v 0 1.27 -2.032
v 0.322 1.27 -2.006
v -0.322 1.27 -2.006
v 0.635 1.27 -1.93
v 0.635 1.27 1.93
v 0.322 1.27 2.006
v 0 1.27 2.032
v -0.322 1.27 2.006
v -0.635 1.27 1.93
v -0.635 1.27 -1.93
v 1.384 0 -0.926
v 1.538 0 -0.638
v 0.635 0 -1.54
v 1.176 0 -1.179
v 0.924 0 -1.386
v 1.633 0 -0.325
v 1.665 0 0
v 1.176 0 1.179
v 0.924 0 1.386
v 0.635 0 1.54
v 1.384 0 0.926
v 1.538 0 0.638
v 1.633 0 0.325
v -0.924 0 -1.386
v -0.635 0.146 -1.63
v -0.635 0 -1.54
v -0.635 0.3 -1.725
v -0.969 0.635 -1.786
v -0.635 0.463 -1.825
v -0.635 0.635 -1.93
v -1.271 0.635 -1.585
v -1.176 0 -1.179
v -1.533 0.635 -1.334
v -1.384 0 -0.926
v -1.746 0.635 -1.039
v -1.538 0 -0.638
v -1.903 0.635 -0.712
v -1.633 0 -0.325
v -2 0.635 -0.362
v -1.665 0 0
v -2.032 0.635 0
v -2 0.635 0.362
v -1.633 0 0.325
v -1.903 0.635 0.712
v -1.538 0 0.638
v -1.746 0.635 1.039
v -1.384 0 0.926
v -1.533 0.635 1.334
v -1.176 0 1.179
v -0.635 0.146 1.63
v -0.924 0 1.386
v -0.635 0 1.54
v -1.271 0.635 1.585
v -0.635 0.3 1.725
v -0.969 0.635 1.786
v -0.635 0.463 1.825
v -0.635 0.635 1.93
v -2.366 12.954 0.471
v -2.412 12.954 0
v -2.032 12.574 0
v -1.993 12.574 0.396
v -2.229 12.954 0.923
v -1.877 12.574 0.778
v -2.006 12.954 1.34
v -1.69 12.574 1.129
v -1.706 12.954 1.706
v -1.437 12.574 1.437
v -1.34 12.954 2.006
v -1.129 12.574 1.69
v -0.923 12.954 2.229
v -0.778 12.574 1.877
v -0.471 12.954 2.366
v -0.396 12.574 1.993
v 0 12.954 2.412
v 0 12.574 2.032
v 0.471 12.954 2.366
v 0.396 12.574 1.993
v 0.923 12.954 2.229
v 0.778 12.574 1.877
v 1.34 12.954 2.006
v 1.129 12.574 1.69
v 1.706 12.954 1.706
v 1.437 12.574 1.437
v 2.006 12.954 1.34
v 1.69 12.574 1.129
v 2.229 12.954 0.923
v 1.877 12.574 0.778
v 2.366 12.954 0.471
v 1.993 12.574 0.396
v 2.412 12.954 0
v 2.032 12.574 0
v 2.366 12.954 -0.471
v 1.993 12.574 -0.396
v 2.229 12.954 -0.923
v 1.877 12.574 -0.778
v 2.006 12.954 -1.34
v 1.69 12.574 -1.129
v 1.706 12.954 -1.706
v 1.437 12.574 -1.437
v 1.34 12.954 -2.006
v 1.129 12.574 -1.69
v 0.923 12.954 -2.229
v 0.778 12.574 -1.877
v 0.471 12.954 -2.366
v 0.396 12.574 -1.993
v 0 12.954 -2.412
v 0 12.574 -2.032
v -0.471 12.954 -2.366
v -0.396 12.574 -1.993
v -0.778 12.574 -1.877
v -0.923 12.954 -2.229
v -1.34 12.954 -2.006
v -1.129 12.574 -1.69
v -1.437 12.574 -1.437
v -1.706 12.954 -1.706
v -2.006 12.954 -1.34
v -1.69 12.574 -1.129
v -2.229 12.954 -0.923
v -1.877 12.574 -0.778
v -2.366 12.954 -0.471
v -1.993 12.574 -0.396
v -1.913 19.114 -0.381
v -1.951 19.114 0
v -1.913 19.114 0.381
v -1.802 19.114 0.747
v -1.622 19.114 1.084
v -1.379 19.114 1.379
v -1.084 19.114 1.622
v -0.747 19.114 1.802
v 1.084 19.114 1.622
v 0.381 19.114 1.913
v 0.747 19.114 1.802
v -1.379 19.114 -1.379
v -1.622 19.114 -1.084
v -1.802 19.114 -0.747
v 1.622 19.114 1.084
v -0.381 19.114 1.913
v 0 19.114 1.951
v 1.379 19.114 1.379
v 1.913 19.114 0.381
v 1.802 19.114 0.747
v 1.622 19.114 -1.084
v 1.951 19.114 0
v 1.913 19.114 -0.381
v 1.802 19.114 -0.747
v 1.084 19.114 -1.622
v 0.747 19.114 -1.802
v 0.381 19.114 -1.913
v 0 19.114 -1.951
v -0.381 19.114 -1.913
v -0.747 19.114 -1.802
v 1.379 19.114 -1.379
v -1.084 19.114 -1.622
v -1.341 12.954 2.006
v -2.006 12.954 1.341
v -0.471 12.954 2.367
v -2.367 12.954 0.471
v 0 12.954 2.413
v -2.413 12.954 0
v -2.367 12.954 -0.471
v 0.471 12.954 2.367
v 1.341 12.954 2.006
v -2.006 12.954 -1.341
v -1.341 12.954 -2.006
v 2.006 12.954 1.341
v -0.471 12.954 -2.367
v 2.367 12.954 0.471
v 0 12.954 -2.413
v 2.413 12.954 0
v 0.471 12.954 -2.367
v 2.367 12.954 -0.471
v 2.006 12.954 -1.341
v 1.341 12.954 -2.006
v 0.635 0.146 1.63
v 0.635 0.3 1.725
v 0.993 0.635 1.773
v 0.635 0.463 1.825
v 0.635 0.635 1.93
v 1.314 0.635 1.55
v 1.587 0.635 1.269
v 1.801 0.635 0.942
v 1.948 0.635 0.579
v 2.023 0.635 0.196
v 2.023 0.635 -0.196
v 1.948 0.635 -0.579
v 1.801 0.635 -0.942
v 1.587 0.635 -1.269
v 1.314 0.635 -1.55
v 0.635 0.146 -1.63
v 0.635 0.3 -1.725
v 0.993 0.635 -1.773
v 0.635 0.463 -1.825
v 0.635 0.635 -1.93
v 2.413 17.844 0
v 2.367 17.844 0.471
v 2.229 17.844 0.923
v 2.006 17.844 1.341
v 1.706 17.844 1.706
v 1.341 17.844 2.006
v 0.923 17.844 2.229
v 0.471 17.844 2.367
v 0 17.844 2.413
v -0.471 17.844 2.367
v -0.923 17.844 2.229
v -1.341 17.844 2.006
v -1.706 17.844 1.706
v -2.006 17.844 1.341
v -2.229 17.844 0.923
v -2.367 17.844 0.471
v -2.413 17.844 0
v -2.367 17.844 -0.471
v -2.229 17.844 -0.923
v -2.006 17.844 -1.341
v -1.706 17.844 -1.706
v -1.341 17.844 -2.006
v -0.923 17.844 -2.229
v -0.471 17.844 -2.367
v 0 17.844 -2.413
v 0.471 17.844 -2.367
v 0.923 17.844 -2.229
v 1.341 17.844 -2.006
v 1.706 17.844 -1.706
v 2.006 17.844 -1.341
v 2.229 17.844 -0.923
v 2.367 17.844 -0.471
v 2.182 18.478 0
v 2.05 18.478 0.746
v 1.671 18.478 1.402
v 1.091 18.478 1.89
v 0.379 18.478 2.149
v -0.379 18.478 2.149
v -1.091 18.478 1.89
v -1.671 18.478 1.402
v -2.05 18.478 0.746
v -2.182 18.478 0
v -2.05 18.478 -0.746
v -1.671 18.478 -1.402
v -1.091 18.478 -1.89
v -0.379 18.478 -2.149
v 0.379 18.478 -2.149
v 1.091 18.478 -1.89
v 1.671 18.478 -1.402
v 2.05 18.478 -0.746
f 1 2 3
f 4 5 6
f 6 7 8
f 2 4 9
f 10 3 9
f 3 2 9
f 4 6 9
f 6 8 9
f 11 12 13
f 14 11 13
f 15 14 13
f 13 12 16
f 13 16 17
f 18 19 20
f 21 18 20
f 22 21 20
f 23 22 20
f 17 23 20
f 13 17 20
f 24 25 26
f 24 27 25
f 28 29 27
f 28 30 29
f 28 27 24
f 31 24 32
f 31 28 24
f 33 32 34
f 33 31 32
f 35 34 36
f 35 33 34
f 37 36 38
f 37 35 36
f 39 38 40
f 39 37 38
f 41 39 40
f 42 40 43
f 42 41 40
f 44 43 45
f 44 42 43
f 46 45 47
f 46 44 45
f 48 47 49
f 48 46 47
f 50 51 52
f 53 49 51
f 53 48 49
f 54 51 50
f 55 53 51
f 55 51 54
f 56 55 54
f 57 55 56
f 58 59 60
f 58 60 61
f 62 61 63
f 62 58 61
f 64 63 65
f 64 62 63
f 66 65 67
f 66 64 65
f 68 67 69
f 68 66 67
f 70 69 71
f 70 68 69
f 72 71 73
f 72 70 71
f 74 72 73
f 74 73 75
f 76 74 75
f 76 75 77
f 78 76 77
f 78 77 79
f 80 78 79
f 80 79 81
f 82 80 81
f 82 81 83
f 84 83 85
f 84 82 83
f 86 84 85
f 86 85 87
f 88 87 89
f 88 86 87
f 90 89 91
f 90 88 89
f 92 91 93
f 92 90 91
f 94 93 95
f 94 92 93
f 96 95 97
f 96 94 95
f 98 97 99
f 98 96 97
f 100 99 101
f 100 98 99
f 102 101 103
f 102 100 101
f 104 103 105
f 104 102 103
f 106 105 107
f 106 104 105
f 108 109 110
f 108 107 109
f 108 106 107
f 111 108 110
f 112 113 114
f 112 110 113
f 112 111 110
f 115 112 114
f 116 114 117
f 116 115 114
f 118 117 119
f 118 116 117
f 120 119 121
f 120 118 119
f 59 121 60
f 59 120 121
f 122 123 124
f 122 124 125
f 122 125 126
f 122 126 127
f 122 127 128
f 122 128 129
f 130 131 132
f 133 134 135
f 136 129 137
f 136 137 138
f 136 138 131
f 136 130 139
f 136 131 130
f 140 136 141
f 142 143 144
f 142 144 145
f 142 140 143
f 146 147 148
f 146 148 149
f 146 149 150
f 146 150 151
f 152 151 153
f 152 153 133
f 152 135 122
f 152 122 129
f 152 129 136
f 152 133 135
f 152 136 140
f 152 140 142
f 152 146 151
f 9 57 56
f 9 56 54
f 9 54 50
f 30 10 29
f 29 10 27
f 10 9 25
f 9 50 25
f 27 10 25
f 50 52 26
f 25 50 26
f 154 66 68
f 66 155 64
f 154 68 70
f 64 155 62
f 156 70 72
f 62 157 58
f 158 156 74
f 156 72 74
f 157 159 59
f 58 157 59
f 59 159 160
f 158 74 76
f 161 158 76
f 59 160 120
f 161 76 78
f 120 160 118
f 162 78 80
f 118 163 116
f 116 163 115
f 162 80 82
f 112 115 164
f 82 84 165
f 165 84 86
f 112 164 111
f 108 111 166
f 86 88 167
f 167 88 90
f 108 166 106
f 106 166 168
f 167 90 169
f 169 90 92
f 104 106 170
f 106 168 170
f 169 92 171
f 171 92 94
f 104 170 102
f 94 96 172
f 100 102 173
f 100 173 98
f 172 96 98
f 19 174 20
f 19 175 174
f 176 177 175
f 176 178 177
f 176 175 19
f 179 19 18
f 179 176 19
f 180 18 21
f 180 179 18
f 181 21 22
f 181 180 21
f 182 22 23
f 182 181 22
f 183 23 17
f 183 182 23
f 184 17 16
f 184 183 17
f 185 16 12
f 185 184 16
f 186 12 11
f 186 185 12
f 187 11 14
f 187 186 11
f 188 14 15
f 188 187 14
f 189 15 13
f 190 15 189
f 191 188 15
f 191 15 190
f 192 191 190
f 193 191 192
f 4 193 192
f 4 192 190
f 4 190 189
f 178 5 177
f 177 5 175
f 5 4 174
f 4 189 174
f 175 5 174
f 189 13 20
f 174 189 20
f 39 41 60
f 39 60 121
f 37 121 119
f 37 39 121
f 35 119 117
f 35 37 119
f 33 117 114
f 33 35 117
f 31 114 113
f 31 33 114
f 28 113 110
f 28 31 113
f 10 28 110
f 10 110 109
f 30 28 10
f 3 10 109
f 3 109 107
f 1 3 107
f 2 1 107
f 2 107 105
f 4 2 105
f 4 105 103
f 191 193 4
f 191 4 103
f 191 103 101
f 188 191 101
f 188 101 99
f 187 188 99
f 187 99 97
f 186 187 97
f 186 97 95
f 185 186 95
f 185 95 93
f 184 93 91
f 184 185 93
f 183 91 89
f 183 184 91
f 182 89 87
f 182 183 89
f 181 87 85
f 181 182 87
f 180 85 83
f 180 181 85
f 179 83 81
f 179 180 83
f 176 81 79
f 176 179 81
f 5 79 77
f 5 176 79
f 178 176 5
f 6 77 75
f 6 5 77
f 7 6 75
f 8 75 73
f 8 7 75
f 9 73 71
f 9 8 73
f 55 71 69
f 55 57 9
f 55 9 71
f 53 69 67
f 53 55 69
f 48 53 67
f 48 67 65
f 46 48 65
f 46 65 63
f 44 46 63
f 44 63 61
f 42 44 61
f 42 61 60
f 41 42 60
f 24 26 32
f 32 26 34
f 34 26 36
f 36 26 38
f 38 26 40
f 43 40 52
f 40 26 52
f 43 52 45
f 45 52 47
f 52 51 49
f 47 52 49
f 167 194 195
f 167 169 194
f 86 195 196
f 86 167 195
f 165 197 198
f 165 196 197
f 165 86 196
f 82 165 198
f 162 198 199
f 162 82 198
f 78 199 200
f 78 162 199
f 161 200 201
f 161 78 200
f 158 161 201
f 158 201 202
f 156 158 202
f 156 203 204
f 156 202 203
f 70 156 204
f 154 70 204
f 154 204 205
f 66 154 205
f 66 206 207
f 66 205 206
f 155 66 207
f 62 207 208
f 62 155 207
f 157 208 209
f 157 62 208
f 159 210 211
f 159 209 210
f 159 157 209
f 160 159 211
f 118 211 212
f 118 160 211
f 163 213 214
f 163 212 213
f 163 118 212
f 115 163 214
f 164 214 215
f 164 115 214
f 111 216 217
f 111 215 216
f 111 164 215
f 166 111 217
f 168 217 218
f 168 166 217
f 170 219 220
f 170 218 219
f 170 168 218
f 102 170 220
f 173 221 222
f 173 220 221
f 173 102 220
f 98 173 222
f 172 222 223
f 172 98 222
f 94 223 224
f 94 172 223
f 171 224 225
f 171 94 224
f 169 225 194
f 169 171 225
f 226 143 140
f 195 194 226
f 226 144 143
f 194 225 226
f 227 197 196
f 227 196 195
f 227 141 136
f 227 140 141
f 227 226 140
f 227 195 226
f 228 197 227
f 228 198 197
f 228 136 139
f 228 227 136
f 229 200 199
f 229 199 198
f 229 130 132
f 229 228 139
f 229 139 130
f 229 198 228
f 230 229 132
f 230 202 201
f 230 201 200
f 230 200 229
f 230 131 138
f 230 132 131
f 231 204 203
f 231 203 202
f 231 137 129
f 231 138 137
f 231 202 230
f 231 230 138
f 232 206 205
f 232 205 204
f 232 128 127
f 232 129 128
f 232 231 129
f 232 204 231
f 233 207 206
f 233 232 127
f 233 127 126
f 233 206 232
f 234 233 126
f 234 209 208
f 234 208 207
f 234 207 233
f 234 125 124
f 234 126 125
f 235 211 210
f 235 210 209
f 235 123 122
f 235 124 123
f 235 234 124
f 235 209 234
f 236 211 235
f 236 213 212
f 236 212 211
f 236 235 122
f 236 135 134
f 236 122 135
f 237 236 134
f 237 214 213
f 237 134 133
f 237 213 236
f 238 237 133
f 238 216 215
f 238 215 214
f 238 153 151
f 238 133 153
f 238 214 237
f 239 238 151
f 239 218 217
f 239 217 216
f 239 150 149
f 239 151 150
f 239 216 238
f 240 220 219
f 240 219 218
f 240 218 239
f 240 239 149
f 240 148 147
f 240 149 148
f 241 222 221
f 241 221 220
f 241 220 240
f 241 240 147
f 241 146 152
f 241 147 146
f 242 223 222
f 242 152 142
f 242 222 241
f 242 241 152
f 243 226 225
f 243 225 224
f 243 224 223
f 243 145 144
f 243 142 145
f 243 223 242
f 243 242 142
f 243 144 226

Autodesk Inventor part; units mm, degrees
ref_plane "YZ Plane" through (0, 0, 0) normal (1, 0, 0) x (0, 1, 0)
ref_plane "XZ Plane" through (0, 0, 0) normal (0, 1, 0) x (-1, 0, 0)
ref_plane "XY Plane" through (0, 0, 0) normal (0, 0, 1) x (1, 0, 0)
sketch "Sketch1" plane through (0, 0, 0) normal (0, 1, 0) x (-1, 0, 0)
  circle A0 centre (0, 0) radius 2.032
  line L0 (-0.635, 2.032) -> (0.635, 2.032)
  line L1 (0.635, 2.032) -> (0.635, -2.032)
  line L2 (0.635, -2.032) -> (-0.635, -2.032)
  line L3 (-0.635, -2.032) -> (-0.635, 2.032)
  line L4 (-0.635, 2.032) -> (0.635, -2.032) construction
  line L5 (0.635, 2.032) -> (-0.635, -2.032) construction
  dimension "d0" = 4.064
  dimension "d10" = 1.27
extrude "Extrusion1" add sketch "Sketch1" along normal blind 12.954 contours A0 L1 | L1 A0 L3 | L3 A0
sketch "Sketch2" plane through (0, 12.954, 0) normal (0, 1, 0) x (1, 0, 0)
  circle A0 centre (0, 0) radius 2.413
  dimension "d5" = 4.826
extrude "Extrusion2" add sketch "Sketch2" along normal blind 6.1595
thread "Thread2" size "10-48 UNS" class "2A" standard "ANSI Unified Screw Threads" length 19.1262
chamfer "Chamfer1" distance 0.381 angle 45 1 edges at (2.032, 12.954, 0)
chamfer "Chamfer2" distance 1.27 angle 20 1 edges at (-2.413, 19.1135, 0) measured on face at (2.4052, 17.0603, 0.1942)
chamfer "Chamfer3" distance 0.635 angle 30 1 edges at (2.032, 0, 0) measured on face at (-2.0254, 8.3823, -0.1635)
extrude "Extrusion3" cut sketch "Sketch1" along normal blind 1.27 contours L1 A0 L3 | A0 L0 L1 | L1 L2 A0 | A0 L3 L0 | L2 L3 A0
properties part number "0.16 Shaft" material "Stainless Steel"
